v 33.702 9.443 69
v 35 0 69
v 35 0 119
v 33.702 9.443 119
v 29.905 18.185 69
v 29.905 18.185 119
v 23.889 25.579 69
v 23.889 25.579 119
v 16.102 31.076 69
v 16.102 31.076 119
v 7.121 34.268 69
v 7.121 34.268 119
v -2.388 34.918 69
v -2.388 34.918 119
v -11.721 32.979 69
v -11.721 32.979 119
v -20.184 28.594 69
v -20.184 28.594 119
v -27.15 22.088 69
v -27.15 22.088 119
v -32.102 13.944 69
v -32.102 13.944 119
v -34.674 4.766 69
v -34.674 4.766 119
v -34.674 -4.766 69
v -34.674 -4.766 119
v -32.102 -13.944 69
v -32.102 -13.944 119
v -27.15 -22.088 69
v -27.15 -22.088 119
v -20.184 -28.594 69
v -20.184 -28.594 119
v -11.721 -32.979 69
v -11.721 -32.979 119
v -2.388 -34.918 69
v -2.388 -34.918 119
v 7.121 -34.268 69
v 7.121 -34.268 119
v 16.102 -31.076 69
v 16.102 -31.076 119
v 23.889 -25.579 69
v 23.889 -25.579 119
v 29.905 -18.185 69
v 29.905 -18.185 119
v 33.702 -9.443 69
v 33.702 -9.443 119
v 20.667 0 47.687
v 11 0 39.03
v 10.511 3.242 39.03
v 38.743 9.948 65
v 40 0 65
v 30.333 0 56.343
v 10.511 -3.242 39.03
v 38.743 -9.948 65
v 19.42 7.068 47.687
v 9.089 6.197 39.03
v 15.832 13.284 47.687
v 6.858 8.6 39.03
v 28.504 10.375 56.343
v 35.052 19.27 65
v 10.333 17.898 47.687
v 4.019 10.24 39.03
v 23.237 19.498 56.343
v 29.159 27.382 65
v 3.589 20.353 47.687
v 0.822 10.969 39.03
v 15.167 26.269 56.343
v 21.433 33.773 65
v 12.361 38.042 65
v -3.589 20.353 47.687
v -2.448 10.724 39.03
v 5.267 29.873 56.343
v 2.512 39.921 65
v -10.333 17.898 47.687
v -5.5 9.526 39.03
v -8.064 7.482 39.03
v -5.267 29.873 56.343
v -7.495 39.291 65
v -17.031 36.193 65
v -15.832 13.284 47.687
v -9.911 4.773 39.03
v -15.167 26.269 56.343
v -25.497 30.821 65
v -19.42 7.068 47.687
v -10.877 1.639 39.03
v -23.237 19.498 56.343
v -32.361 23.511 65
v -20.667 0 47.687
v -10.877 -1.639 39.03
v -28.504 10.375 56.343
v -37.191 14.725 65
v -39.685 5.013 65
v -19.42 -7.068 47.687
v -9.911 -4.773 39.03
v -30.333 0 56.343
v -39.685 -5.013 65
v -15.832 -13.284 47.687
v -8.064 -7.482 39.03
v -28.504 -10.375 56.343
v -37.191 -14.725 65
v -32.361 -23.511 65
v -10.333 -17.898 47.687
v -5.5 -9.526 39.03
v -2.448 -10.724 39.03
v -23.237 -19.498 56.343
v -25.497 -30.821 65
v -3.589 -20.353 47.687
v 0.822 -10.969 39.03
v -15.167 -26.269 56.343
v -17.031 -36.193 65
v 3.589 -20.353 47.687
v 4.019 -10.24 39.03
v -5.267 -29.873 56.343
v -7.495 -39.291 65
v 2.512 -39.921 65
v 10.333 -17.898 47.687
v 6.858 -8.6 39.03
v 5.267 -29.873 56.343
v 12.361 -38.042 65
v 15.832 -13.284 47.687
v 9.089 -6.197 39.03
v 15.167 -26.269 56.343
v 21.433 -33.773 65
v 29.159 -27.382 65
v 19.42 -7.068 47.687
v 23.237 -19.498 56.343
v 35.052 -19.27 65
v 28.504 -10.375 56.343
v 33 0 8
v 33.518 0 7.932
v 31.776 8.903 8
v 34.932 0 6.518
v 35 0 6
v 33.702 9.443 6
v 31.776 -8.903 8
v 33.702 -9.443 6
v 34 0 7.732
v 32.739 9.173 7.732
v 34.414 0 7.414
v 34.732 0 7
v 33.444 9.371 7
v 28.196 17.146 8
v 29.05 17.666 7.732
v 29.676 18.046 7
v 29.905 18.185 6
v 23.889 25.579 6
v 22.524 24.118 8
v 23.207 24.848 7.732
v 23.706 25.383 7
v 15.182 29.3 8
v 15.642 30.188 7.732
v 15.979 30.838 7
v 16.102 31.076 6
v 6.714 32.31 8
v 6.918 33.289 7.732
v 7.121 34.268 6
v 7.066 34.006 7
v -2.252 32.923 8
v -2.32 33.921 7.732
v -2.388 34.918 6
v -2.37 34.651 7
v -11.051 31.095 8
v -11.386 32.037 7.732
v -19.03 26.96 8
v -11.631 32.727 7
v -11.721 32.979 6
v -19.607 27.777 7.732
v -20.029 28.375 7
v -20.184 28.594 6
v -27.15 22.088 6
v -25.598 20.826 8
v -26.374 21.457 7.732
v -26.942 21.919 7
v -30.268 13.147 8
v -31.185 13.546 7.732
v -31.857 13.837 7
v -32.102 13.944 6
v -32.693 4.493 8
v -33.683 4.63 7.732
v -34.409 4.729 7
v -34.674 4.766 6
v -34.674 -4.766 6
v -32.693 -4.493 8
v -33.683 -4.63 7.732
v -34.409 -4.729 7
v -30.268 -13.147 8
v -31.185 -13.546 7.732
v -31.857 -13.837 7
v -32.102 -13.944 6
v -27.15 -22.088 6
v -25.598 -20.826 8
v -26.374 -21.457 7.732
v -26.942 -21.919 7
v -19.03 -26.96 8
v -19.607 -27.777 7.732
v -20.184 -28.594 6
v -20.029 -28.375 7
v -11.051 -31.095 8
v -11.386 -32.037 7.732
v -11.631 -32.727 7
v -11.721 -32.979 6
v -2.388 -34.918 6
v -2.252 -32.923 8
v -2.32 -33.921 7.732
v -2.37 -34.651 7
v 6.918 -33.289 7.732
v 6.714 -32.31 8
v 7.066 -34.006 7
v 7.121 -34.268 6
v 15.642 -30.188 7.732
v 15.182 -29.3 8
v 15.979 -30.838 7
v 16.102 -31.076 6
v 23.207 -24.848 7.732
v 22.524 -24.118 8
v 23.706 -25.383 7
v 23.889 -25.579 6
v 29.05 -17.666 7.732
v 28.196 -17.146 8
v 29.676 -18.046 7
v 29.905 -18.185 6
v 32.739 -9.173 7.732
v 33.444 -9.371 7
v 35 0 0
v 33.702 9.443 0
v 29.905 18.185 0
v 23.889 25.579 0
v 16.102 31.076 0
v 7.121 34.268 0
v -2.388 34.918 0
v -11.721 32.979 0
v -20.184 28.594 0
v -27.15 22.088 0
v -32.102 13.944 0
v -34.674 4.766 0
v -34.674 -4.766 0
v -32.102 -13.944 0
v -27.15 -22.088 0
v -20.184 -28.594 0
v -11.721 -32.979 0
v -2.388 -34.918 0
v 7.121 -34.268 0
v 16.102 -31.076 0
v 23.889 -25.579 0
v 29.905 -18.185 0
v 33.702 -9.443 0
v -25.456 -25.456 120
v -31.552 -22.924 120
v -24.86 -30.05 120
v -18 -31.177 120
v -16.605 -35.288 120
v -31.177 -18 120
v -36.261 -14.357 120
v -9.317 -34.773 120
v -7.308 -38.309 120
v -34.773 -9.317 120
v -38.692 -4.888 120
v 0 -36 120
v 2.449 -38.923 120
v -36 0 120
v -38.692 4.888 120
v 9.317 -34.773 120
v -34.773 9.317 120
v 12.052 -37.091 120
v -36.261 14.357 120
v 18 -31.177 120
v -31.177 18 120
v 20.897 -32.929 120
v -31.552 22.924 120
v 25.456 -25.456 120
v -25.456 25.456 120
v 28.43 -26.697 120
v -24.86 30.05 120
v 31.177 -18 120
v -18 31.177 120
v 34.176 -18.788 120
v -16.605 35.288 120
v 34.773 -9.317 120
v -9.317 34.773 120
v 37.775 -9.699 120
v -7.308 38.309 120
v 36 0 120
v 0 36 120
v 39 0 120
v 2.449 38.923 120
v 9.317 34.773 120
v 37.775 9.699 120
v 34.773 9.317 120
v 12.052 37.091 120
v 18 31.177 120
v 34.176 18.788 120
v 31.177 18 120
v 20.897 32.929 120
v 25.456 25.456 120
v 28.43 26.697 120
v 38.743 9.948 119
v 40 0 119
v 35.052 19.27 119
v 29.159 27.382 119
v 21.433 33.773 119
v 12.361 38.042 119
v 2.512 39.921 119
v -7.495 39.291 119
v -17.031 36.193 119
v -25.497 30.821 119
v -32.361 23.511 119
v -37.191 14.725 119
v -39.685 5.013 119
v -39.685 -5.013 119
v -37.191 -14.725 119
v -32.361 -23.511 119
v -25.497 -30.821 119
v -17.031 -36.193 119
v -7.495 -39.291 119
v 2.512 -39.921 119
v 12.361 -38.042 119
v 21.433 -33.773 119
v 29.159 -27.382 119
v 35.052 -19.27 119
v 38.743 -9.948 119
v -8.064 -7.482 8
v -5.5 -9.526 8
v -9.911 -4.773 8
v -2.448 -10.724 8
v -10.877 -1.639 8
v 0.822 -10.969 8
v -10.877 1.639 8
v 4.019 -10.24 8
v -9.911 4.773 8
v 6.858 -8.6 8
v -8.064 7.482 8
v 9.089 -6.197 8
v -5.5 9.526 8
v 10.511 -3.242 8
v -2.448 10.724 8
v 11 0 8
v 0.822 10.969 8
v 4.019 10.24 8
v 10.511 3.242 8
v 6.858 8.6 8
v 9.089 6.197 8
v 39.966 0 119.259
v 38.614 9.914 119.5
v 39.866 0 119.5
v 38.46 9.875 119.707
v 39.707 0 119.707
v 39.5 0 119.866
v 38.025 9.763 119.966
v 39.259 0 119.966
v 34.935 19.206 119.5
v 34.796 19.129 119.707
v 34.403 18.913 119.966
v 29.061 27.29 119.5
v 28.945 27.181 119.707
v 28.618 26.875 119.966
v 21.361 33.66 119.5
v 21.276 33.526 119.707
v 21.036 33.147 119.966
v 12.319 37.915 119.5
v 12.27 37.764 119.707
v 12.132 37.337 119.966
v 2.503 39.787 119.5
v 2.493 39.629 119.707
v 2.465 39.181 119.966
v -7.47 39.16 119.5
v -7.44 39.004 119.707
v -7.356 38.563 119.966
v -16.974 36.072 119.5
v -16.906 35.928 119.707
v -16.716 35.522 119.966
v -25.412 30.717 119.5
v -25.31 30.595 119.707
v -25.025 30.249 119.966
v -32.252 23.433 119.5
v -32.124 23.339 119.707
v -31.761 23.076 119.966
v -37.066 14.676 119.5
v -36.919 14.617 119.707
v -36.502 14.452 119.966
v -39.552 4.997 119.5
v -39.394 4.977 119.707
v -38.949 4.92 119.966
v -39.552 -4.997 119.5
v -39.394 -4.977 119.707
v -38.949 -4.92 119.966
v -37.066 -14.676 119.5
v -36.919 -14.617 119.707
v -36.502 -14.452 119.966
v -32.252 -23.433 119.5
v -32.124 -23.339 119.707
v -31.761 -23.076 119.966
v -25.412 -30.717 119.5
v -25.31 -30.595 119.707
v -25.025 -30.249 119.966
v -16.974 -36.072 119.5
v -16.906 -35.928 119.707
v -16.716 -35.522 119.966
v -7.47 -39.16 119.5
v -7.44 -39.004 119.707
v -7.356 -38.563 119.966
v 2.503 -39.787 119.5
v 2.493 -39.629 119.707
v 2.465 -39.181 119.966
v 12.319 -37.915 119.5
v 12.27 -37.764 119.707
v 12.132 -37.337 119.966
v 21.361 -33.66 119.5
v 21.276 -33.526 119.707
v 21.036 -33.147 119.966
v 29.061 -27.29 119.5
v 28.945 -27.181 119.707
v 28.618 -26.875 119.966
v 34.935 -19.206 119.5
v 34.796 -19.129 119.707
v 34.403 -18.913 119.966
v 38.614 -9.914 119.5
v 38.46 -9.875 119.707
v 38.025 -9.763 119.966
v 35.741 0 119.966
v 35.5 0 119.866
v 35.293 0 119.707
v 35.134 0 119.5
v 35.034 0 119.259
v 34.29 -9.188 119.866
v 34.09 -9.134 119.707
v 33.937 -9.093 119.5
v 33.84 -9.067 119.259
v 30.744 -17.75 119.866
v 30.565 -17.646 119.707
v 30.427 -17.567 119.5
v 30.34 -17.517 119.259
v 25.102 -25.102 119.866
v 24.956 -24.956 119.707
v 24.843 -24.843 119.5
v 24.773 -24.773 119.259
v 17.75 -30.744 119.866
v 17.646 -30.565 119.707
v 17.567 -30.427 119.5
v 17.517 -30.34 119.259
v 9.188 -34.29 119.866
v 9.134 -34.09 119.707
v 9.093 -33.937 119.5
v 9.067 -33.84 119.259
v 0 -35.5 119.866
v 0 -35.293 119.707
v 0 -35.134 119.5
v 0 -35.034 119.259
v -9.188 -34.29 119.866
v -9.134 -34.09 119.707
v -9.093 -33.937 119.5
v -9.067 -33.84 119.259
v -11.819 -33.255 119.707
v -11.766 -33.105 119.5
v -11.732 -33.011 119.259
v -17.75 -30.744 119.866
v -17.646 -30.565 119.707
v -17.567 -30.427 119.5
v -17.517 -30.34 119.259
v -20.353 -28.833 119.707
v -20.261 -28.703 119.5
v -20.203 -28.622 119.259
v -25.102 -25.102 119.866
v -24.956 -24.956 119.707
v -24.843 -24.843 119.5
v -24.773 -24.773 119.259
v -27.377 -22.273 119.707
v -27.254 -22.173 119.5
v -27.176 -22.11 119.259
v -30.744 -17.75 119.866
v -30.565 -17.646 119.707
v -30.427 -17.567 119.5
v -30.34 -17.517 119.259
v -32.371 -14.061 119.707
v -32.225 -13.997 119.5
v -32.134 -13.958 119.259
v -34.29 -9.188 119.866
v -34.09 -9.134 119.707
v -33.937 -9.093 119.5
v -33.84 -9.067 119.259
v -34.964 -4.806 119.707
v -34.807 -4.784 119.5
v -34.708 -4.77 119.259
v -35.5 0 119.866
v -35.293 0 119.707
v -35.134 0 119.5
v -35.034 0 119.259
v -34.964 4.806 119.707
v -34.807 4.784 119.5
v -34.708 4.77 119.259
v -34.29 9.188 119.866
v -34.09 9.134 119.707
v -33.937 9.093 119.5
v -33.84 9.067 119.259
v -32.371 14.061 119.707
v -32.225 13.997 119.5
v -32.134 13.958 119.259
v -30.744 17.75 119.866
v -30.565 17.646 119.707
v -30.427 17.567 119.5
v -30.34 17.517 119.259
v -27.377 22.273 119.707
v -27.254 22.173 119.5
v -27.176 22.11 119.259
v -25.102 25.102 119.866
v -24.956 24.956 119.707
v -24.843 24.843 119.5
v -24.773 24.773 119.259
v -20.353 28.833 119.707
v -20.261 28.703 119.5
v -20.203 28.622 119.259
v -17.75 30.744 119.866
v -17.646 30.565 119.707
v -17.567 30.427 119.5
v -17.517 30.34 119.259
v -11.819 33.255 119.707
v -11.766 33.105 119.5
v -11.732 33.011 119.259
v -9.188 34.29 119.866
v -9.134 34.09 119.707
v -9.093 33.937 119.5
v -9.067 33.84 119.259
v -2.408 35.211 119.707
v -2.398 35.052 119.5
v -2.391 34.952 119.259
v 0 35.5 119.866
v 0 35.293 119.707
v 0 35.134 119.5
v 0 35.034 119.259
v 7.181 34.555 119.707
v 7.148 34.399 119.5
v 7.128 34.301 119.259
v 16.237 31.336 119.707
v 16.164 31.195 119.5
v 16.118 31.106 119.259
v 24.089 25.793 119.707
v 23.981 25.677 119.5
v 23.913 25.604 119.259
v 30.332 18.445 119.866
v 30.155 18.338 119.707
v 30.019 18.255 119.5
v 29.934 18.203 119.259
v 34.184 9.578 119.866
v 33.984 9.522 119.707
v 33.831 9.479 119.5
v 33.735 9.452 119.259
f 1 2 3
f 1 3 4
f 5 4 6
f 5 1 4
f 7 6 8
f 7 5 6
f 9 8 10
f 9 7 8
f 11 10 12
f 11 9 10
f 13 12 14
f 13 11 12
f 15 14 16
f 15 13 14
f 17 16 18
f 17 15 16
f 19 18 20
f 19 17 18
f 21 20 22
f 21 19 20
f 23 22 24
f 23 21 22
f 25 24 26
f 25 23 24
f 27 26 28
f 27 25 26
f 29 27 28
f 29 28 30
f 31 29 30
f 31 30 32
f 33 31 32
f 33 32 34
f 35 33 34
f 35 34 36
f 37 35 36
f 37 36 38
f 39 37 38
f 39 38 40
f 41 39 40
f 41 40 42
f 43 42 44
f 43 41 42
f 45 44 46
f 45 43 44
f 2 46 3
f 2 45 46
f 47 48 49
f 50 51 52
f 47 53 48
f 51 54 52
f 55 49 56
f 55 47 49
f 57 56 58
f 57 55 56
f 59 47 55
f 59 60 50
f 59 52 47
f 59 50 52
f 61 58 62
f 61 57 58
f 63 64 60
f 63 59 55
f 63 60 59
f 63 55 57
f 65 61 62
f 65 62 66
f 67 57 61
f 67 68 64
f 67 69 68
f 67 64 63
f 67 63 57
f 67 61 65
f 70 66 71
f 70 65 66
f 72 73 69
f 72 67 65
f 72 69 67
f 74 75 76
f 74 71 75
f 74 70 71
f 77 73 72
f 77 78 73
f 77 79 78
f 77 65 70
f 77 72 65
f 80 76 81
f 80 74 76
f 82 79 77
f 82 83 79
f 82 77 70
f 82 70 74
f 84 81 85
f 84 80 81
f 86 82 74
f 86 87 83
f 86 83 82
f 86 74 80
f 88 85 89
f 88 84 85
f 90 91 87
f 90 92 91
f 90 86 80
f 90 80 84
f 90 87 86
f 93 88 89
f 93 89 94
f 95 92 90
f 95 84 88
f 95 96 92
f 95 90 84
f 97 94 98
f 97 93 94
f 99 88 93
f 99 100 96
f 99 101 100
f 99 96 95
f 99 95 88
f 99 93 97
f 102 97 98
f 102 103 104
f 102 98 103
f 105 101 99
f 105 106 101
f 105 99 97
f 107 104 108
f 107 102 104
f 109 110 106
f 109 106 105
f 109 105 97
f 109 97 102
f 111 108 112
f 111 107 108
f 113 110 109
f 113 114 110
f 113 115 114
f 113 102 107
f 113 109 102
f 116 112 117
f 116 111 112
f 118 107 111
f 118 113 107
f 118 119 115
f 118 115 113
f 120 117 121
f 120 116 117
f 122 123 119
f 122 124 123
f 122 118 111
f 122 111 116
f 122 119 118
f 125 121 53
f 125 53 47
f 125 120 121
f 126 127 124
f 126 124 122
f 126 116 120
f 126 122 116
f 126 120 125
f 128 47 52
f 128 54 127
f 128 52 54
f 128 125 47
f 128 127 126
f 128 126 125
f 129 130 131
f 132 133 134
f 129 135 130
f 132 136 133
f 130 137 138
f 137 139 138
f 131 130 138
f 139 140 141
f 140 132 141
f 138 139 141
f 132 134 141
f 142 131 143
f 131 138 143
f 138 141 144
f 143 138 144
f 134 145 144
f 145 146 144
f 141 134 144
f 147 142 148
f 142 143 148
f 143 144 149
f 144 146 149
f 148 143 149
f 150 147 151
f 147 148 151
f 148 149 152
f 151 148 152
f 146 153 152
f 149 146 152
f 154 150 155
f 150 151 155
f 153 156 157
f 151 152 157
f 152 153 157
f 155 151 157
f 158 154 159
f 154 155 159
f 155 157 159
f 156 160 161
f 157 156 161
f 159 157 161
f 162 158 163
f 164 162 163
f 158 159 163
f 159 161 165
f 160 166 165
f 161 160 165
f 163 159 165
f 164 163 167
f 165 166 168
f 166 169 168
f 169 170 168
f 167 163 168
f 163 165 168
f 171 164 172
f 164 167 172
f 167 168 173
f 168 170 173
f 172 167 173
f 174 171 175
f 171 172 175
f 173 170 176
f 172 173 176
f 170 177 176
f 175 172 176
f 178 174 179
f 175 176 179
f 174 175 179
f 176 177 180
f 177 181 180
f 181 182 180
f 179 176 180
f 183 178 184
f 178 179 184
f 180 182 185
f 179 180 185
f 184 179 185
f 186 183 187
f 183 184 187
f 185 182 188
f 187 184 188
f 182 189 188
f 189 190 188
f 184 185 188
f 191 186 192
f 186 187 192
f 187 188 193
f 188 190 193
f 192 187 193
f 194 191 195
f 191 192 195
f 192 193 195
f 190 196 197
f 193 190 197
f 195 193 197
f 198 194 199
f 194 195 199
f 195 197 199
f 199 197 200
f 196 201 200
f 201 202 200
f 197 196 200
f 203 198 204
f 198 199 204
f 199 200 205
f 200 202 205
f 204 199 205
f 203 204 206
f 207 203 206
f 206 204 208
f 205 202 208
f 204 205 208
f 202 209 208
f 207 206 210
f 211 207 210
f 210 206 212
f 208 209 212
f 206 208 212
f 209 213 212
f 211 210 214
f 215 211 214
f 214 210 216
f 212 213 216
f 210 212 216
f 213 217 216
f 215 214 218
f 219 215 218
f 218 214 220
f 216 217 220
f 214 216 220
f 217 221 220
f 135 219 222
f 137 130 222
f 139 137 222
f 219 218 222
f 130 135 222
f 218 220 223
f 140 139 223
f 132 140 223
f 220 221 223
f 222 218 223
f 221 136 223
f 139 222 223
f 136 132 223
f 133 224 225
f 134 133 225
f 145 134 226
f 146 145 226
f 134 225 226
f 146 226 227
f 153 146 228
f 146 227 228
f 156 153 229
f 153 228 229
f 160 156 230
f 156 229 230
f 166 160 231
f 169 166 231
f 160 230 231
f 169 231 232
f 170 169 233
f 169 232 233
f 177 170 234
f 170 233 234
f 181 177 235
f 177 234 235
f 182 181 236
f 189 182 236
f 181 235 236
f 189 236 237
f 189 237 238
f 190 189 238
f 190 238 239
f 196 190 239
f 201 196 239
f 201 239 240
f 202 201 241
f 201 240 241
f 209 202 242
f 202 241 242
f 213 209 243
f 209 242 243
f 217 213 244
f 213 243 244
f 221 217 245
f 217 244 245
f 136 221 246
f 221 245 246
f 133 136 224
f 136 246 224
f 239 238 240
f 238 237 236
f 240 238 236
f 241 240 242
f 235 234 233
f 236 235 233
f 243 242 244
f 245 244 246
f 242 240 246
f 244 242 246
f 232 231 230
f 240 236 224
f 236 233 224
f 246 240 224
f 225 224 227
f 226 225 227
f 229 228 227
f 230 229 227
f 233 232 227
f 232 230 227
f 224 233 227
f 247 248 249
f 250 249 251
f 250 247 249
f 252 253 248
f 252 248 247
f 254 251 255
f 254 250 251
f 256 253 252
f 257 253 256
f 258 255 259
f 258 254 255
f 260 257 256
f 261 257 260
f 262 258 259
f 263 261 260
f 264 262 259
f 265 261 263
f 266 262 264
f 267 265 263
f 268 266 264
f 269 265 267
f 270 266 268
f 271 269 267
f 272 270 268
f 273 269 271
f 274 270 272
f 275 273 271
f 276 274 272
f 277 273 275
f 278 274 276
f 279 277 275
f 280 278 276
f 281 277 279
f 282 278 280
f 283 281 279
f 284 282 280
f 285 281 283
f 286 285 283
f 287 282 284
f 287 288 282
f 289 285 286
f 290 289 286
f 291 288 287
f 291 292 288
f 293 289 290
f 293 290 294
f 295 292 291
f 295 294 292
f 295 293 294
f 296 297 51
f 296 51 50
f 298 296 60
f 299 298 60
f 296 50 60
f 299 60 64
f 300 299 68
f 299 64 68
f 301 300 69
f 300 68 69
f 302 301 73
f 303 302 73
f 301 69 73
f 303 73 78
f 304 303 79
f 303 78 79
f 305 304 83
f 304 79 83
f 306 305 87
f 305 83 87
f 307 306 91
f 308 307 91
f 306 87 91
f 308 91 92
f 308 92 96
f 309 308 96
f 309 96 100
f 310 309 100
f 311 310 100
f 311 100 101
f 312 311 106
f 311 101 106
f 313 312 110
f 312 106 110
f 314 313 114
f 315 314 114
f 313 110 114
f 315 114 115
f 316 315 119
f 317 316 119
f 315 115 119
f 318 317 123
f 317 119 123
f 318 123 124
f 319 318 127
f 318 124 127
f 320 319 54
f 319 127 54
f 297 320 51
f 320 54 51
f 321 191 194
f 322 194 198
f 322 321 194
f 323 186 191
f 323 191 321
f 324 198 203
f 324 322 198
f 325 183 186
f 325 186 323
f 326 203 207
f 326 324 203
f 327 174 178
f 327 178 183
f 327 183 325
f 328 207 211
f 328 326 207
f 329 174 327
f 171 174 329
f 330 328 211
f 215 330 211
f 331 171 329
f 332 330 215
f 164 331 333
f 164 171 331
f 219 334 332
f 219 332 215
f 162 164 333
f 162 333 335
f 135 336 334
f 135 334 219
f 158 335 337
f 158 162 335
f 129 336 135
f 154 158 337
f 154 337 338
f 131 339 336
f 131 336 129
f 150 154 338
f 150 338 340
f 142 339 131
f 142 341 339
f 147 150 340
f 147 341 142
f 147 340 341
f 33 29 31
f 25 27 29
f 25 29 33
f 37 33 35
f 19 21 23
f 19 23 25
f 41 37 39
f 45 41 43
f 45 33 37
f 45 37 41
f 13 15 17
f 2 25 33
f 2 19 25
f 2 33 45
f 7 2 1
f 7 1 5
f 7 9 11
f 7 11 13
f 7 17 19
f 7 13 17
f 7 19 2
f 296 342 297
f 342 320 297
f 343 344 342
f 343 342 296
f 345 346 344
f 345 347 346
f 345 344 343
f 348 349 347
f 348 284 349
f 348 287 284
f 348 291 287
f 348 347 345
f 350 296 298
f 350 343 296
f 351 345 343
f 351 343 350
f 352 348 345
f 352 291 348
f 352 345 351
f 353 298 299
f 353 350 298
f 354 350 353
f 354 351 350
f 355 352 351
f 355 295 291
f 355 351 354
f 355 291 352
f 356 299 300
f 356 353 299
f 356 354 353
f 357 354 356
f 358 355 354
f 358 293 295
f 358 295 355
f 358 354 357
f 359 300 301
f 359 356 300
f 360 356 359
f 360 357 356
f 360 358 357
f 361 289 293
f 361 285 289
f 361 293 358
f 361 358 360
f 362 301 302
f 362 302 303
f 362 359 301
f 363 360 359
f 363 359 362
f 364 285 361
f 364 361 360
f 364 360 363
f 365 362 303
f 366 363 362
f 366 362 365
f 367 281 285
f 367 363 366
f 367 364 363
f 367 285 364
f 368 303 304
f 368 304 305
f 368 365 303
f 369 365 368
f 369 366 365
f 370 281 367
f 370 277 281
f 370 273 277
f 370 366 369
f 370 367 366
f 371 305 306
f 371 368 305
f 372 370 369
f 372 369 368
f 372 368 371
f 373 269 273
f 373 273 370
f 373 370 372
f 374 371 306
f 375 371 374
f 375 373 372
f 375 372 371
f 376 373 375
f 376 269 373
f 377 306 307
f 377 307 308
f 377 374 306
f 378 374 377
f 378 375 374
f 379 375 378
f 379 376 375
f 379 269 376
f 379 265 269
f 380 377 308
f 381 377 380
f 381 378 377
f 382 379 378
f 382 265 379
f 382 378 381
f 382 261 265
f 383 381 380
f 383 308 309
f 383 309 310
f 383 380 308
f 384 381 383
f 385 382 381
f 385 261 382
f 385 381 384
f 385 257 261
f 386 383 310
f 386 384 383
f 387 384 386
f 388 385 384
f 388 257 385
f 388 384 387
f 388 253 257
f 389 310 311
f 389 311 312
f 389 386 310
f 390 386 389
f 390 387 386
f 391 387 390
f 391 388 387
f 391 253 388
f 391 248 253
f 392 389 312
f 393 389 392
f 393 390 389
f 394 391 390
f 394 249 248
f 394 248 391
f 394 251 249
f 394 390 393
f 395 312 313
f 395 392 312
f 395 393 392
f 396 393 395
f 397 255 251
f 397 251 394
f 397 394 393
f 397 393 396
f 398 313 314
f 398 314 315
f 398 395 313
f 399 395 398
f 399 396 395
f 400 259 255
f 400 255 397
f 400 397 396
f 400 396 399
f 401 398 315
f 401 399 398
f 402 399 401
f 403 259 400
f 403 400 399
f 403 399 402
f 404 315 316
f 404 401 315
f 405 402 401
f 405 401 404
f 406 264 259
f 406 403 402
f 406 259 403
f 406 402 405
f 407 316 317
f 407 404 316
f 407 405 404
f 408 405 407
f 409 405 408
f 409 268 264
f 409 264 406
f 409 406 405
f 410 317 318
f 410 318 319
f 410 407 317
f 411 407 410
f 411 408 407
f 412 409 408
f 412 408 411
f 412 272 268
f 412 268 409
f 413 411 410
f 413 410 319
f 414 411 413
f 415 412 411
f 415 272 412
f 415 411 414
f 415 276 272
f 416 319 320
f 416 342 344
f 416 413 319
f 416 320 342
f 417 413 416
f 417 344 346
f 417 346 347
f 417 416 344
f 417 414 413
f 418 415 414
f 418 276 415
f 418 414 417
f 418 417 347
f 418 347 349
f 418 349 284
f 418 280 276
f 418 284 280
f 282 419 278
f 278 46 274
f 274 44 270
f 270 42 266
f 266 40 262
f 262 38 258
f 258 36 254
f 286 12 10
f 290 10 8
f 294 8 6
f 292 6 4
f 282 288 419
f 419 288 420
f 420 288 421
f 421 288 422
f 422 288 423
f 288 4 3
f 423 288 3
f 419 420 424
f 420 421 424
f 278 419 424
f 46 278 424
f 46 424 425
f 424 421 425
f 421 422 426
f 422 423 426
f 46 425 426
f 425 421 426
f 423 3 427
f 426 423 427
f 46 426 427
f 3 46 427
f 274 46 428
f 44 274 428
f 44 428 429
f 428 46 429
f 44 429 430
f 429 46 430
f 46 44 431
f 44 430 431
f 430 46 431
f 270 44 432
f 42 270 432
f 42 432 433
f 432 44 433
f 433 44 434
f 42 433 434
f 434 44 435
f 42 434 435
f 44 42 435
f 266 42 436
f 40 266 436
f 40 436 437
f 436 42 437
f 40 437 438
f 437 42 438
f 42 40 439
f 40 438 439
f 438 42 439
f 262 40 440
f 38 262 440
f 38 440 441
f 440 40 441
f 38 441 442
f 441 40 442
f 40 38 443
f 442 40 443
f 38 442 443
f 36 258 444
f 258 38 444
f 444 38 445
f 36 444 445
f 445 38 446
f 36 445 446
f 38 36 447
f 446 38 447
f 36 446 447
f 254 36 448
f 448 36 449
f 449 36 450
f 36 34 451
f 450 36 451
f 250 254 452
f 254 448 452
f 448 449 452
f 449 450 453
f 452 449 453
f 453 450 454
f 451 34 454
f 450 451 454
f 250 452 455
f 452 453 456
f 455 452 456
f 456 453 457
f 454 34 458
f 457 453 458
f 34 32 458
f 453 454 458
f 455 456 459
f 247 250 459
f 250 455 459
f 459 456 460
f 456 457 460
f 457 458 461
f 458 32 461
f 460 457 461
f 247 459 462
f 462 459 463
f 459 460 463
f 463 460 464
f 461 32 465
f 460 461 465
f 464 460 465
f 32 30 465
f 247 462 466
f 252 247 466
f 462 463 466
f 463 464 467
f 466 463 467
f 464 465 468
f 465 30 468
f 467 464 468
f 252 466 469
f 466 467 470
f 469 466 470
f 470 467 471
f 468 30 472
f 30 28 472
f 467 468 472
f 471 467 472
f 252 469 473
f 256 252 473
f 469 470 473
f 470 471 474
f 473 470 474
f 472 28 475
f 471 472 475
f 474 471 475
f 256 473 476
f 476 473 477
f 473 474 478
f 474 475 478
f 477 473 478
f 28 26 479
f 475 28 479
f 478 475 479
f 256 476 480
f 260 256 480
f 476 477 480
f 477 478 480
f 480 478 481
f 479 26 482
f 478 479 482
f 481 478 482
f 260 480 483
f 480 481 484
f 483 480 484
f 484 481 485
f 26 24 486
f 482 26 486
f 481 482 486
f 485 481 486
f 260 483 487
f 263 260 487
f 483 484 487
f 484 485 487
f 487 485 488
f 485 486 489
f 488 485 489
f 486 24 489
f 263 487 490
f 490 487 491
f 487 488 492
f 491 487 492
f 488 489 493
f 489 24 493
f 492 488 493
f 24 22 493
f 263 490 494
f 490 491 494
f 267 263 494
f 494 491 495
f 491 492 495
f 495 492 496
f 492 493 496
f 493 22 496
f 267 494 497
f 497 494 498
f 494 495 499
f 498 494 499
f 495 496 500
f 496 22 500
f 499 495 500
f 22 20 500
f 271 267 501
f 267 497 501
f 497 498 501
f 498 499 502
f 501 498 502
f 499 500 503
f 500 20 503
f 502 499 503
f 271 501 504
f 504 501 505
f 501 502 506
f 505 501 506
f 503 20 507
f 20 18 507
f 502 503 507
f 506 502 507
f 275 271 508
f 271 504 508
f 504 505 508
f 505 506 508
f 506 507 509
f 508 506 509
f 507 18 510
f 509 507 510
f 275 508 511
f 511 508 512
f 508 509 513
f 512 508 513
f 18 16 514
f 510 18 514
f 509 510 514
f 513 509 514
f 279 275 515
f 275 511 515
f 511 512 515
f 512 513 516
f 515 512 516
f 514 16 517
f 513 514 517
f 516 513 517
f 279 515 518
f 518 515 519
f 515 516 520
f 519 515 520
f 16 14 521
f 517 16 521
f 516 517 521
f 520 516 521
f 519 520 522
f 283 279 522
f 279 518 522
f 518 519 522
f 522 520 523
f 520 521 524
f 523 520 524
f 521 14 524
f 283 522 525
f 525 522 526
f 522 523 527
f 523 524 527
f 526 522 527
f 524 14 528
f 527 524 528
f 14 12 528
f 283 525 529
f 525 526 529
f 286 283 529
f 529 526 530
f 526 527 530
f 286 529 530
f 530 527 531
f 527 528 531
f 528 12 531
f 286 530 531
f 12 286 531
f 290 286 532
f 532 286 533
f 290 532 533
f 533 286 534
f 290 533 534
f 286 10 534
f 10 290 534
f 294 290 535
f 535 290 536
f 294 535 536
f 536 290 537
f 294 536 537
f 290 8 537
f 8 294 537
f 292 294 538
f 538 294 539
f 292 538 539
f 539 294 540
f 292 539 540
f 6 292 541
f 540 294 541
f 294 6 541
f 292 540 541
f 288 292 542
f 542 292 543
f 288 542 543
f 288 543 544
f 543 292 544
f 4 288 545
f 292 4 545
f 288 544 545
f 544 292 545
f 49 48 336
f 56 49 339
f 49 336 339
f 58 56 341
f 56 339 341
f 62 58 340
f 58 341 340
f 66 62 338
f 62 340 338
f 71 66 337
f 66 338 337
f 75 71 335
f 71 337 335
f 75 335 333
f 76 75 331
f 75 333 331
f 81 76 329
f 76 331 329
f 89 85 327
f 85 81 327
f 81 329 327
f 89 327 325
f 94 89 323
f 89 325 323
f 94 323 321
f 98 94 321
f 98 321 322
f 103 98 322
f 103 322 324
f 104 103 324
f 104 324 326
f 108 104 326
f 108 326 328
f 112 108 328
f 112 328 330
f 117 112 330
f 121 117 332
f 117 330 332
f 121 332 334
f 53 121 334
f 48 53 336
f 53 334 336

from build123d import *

# Parameters (mm, degrees)
CYLINDER003_R     = 35
CYLINDER003_DEPTH = 55
CYLINDER002_R     = 40
CYLINDER002_DEPTH = 55
CYLINDER_R        = 35
CYLINDER_DEPTH    = 8
CYLINDER001_R     = 11
CYLINDER001_DEPTH = 65
FILLET_R          = 2
FILLET001_R       = 1
FILLET002_R       = 1


with BuildPart() as cone:
    # Cone → Cone (revolve)
    with BuildSketch(Plane(origin=(0, 0, 35), x_dir=(1, 0, 0), z_dir=(0, -1, 0))):
        Polygon((0, 0), (6.5, 0), (40, 30), (0, 30), align=None)
    revolve(axis=Axis((0, 0, 35), (0, 0, 1)))


with BuildPart() as cylinder003:
    # Cylinder003 → Cylinder003 (new body)
    with BuildSketch(Plane.XY.offset(69)):
        Circle(CYLINDER003_R)
    extrude(amount=CYLINDER003_DEPTH)


with BuildPart() as cut:
    # Cylinder002 → Cylinder002 (new body)
    with BuildSketch(Plane.XY.offset(65)):
        Circle(CYLINDER002_R)
    extrude(amount=CYLINDER002_DEPTH)

    # Cut: cut Cylinder003
    add(cylinder003.part, mode=Mode.SUBTRACT)


with BuildPart() as cylinder:
    # Cylinder → Cylinder (new body)
    with BuildSketch(Plane.XY):
        Circle(CYLINDER_R)
    extrude(amount=CYLINDER_DEPTH)


with BuildPart() as fillet002:
    # Cylinder001 → Cylinder001 (new body)
    with BuildSketch(Plane.XY):
        Circle(CYLINDER001_R)
    extrude(amount=CYLINDER001_DEPTH)

    # Fusion: union Cylinder
    add(cylinder.part)

    # Fusion001: union Cut
    add(cut.part)

    # Fusion002: union Cone
    add(cone.part)

    # Fillet
    fillet_edges = [fillet002.edges().sort_by_distance(p)[0] for p in [
        (-35, 0, 8),
    ]]
    fillet(fillet_edges, radius=FILLET_R)

    # Fillet001
    fillet001_edges = [fillet002.edges().sort_by_distance(p)[0] for p in [
        (-40, 0, 120),
    ]]
    fillet(fillet001_edges, radius=FILLET001_R)

    # Fillet002
    fillet002_edges = [fillet002.edges().sort_by_distance(p)[0] for p in [
        (-35, 0, 120),
    ]]
    fillet(fillet002_edges, radius=FILLET002_R)


solid = fillet002.part
